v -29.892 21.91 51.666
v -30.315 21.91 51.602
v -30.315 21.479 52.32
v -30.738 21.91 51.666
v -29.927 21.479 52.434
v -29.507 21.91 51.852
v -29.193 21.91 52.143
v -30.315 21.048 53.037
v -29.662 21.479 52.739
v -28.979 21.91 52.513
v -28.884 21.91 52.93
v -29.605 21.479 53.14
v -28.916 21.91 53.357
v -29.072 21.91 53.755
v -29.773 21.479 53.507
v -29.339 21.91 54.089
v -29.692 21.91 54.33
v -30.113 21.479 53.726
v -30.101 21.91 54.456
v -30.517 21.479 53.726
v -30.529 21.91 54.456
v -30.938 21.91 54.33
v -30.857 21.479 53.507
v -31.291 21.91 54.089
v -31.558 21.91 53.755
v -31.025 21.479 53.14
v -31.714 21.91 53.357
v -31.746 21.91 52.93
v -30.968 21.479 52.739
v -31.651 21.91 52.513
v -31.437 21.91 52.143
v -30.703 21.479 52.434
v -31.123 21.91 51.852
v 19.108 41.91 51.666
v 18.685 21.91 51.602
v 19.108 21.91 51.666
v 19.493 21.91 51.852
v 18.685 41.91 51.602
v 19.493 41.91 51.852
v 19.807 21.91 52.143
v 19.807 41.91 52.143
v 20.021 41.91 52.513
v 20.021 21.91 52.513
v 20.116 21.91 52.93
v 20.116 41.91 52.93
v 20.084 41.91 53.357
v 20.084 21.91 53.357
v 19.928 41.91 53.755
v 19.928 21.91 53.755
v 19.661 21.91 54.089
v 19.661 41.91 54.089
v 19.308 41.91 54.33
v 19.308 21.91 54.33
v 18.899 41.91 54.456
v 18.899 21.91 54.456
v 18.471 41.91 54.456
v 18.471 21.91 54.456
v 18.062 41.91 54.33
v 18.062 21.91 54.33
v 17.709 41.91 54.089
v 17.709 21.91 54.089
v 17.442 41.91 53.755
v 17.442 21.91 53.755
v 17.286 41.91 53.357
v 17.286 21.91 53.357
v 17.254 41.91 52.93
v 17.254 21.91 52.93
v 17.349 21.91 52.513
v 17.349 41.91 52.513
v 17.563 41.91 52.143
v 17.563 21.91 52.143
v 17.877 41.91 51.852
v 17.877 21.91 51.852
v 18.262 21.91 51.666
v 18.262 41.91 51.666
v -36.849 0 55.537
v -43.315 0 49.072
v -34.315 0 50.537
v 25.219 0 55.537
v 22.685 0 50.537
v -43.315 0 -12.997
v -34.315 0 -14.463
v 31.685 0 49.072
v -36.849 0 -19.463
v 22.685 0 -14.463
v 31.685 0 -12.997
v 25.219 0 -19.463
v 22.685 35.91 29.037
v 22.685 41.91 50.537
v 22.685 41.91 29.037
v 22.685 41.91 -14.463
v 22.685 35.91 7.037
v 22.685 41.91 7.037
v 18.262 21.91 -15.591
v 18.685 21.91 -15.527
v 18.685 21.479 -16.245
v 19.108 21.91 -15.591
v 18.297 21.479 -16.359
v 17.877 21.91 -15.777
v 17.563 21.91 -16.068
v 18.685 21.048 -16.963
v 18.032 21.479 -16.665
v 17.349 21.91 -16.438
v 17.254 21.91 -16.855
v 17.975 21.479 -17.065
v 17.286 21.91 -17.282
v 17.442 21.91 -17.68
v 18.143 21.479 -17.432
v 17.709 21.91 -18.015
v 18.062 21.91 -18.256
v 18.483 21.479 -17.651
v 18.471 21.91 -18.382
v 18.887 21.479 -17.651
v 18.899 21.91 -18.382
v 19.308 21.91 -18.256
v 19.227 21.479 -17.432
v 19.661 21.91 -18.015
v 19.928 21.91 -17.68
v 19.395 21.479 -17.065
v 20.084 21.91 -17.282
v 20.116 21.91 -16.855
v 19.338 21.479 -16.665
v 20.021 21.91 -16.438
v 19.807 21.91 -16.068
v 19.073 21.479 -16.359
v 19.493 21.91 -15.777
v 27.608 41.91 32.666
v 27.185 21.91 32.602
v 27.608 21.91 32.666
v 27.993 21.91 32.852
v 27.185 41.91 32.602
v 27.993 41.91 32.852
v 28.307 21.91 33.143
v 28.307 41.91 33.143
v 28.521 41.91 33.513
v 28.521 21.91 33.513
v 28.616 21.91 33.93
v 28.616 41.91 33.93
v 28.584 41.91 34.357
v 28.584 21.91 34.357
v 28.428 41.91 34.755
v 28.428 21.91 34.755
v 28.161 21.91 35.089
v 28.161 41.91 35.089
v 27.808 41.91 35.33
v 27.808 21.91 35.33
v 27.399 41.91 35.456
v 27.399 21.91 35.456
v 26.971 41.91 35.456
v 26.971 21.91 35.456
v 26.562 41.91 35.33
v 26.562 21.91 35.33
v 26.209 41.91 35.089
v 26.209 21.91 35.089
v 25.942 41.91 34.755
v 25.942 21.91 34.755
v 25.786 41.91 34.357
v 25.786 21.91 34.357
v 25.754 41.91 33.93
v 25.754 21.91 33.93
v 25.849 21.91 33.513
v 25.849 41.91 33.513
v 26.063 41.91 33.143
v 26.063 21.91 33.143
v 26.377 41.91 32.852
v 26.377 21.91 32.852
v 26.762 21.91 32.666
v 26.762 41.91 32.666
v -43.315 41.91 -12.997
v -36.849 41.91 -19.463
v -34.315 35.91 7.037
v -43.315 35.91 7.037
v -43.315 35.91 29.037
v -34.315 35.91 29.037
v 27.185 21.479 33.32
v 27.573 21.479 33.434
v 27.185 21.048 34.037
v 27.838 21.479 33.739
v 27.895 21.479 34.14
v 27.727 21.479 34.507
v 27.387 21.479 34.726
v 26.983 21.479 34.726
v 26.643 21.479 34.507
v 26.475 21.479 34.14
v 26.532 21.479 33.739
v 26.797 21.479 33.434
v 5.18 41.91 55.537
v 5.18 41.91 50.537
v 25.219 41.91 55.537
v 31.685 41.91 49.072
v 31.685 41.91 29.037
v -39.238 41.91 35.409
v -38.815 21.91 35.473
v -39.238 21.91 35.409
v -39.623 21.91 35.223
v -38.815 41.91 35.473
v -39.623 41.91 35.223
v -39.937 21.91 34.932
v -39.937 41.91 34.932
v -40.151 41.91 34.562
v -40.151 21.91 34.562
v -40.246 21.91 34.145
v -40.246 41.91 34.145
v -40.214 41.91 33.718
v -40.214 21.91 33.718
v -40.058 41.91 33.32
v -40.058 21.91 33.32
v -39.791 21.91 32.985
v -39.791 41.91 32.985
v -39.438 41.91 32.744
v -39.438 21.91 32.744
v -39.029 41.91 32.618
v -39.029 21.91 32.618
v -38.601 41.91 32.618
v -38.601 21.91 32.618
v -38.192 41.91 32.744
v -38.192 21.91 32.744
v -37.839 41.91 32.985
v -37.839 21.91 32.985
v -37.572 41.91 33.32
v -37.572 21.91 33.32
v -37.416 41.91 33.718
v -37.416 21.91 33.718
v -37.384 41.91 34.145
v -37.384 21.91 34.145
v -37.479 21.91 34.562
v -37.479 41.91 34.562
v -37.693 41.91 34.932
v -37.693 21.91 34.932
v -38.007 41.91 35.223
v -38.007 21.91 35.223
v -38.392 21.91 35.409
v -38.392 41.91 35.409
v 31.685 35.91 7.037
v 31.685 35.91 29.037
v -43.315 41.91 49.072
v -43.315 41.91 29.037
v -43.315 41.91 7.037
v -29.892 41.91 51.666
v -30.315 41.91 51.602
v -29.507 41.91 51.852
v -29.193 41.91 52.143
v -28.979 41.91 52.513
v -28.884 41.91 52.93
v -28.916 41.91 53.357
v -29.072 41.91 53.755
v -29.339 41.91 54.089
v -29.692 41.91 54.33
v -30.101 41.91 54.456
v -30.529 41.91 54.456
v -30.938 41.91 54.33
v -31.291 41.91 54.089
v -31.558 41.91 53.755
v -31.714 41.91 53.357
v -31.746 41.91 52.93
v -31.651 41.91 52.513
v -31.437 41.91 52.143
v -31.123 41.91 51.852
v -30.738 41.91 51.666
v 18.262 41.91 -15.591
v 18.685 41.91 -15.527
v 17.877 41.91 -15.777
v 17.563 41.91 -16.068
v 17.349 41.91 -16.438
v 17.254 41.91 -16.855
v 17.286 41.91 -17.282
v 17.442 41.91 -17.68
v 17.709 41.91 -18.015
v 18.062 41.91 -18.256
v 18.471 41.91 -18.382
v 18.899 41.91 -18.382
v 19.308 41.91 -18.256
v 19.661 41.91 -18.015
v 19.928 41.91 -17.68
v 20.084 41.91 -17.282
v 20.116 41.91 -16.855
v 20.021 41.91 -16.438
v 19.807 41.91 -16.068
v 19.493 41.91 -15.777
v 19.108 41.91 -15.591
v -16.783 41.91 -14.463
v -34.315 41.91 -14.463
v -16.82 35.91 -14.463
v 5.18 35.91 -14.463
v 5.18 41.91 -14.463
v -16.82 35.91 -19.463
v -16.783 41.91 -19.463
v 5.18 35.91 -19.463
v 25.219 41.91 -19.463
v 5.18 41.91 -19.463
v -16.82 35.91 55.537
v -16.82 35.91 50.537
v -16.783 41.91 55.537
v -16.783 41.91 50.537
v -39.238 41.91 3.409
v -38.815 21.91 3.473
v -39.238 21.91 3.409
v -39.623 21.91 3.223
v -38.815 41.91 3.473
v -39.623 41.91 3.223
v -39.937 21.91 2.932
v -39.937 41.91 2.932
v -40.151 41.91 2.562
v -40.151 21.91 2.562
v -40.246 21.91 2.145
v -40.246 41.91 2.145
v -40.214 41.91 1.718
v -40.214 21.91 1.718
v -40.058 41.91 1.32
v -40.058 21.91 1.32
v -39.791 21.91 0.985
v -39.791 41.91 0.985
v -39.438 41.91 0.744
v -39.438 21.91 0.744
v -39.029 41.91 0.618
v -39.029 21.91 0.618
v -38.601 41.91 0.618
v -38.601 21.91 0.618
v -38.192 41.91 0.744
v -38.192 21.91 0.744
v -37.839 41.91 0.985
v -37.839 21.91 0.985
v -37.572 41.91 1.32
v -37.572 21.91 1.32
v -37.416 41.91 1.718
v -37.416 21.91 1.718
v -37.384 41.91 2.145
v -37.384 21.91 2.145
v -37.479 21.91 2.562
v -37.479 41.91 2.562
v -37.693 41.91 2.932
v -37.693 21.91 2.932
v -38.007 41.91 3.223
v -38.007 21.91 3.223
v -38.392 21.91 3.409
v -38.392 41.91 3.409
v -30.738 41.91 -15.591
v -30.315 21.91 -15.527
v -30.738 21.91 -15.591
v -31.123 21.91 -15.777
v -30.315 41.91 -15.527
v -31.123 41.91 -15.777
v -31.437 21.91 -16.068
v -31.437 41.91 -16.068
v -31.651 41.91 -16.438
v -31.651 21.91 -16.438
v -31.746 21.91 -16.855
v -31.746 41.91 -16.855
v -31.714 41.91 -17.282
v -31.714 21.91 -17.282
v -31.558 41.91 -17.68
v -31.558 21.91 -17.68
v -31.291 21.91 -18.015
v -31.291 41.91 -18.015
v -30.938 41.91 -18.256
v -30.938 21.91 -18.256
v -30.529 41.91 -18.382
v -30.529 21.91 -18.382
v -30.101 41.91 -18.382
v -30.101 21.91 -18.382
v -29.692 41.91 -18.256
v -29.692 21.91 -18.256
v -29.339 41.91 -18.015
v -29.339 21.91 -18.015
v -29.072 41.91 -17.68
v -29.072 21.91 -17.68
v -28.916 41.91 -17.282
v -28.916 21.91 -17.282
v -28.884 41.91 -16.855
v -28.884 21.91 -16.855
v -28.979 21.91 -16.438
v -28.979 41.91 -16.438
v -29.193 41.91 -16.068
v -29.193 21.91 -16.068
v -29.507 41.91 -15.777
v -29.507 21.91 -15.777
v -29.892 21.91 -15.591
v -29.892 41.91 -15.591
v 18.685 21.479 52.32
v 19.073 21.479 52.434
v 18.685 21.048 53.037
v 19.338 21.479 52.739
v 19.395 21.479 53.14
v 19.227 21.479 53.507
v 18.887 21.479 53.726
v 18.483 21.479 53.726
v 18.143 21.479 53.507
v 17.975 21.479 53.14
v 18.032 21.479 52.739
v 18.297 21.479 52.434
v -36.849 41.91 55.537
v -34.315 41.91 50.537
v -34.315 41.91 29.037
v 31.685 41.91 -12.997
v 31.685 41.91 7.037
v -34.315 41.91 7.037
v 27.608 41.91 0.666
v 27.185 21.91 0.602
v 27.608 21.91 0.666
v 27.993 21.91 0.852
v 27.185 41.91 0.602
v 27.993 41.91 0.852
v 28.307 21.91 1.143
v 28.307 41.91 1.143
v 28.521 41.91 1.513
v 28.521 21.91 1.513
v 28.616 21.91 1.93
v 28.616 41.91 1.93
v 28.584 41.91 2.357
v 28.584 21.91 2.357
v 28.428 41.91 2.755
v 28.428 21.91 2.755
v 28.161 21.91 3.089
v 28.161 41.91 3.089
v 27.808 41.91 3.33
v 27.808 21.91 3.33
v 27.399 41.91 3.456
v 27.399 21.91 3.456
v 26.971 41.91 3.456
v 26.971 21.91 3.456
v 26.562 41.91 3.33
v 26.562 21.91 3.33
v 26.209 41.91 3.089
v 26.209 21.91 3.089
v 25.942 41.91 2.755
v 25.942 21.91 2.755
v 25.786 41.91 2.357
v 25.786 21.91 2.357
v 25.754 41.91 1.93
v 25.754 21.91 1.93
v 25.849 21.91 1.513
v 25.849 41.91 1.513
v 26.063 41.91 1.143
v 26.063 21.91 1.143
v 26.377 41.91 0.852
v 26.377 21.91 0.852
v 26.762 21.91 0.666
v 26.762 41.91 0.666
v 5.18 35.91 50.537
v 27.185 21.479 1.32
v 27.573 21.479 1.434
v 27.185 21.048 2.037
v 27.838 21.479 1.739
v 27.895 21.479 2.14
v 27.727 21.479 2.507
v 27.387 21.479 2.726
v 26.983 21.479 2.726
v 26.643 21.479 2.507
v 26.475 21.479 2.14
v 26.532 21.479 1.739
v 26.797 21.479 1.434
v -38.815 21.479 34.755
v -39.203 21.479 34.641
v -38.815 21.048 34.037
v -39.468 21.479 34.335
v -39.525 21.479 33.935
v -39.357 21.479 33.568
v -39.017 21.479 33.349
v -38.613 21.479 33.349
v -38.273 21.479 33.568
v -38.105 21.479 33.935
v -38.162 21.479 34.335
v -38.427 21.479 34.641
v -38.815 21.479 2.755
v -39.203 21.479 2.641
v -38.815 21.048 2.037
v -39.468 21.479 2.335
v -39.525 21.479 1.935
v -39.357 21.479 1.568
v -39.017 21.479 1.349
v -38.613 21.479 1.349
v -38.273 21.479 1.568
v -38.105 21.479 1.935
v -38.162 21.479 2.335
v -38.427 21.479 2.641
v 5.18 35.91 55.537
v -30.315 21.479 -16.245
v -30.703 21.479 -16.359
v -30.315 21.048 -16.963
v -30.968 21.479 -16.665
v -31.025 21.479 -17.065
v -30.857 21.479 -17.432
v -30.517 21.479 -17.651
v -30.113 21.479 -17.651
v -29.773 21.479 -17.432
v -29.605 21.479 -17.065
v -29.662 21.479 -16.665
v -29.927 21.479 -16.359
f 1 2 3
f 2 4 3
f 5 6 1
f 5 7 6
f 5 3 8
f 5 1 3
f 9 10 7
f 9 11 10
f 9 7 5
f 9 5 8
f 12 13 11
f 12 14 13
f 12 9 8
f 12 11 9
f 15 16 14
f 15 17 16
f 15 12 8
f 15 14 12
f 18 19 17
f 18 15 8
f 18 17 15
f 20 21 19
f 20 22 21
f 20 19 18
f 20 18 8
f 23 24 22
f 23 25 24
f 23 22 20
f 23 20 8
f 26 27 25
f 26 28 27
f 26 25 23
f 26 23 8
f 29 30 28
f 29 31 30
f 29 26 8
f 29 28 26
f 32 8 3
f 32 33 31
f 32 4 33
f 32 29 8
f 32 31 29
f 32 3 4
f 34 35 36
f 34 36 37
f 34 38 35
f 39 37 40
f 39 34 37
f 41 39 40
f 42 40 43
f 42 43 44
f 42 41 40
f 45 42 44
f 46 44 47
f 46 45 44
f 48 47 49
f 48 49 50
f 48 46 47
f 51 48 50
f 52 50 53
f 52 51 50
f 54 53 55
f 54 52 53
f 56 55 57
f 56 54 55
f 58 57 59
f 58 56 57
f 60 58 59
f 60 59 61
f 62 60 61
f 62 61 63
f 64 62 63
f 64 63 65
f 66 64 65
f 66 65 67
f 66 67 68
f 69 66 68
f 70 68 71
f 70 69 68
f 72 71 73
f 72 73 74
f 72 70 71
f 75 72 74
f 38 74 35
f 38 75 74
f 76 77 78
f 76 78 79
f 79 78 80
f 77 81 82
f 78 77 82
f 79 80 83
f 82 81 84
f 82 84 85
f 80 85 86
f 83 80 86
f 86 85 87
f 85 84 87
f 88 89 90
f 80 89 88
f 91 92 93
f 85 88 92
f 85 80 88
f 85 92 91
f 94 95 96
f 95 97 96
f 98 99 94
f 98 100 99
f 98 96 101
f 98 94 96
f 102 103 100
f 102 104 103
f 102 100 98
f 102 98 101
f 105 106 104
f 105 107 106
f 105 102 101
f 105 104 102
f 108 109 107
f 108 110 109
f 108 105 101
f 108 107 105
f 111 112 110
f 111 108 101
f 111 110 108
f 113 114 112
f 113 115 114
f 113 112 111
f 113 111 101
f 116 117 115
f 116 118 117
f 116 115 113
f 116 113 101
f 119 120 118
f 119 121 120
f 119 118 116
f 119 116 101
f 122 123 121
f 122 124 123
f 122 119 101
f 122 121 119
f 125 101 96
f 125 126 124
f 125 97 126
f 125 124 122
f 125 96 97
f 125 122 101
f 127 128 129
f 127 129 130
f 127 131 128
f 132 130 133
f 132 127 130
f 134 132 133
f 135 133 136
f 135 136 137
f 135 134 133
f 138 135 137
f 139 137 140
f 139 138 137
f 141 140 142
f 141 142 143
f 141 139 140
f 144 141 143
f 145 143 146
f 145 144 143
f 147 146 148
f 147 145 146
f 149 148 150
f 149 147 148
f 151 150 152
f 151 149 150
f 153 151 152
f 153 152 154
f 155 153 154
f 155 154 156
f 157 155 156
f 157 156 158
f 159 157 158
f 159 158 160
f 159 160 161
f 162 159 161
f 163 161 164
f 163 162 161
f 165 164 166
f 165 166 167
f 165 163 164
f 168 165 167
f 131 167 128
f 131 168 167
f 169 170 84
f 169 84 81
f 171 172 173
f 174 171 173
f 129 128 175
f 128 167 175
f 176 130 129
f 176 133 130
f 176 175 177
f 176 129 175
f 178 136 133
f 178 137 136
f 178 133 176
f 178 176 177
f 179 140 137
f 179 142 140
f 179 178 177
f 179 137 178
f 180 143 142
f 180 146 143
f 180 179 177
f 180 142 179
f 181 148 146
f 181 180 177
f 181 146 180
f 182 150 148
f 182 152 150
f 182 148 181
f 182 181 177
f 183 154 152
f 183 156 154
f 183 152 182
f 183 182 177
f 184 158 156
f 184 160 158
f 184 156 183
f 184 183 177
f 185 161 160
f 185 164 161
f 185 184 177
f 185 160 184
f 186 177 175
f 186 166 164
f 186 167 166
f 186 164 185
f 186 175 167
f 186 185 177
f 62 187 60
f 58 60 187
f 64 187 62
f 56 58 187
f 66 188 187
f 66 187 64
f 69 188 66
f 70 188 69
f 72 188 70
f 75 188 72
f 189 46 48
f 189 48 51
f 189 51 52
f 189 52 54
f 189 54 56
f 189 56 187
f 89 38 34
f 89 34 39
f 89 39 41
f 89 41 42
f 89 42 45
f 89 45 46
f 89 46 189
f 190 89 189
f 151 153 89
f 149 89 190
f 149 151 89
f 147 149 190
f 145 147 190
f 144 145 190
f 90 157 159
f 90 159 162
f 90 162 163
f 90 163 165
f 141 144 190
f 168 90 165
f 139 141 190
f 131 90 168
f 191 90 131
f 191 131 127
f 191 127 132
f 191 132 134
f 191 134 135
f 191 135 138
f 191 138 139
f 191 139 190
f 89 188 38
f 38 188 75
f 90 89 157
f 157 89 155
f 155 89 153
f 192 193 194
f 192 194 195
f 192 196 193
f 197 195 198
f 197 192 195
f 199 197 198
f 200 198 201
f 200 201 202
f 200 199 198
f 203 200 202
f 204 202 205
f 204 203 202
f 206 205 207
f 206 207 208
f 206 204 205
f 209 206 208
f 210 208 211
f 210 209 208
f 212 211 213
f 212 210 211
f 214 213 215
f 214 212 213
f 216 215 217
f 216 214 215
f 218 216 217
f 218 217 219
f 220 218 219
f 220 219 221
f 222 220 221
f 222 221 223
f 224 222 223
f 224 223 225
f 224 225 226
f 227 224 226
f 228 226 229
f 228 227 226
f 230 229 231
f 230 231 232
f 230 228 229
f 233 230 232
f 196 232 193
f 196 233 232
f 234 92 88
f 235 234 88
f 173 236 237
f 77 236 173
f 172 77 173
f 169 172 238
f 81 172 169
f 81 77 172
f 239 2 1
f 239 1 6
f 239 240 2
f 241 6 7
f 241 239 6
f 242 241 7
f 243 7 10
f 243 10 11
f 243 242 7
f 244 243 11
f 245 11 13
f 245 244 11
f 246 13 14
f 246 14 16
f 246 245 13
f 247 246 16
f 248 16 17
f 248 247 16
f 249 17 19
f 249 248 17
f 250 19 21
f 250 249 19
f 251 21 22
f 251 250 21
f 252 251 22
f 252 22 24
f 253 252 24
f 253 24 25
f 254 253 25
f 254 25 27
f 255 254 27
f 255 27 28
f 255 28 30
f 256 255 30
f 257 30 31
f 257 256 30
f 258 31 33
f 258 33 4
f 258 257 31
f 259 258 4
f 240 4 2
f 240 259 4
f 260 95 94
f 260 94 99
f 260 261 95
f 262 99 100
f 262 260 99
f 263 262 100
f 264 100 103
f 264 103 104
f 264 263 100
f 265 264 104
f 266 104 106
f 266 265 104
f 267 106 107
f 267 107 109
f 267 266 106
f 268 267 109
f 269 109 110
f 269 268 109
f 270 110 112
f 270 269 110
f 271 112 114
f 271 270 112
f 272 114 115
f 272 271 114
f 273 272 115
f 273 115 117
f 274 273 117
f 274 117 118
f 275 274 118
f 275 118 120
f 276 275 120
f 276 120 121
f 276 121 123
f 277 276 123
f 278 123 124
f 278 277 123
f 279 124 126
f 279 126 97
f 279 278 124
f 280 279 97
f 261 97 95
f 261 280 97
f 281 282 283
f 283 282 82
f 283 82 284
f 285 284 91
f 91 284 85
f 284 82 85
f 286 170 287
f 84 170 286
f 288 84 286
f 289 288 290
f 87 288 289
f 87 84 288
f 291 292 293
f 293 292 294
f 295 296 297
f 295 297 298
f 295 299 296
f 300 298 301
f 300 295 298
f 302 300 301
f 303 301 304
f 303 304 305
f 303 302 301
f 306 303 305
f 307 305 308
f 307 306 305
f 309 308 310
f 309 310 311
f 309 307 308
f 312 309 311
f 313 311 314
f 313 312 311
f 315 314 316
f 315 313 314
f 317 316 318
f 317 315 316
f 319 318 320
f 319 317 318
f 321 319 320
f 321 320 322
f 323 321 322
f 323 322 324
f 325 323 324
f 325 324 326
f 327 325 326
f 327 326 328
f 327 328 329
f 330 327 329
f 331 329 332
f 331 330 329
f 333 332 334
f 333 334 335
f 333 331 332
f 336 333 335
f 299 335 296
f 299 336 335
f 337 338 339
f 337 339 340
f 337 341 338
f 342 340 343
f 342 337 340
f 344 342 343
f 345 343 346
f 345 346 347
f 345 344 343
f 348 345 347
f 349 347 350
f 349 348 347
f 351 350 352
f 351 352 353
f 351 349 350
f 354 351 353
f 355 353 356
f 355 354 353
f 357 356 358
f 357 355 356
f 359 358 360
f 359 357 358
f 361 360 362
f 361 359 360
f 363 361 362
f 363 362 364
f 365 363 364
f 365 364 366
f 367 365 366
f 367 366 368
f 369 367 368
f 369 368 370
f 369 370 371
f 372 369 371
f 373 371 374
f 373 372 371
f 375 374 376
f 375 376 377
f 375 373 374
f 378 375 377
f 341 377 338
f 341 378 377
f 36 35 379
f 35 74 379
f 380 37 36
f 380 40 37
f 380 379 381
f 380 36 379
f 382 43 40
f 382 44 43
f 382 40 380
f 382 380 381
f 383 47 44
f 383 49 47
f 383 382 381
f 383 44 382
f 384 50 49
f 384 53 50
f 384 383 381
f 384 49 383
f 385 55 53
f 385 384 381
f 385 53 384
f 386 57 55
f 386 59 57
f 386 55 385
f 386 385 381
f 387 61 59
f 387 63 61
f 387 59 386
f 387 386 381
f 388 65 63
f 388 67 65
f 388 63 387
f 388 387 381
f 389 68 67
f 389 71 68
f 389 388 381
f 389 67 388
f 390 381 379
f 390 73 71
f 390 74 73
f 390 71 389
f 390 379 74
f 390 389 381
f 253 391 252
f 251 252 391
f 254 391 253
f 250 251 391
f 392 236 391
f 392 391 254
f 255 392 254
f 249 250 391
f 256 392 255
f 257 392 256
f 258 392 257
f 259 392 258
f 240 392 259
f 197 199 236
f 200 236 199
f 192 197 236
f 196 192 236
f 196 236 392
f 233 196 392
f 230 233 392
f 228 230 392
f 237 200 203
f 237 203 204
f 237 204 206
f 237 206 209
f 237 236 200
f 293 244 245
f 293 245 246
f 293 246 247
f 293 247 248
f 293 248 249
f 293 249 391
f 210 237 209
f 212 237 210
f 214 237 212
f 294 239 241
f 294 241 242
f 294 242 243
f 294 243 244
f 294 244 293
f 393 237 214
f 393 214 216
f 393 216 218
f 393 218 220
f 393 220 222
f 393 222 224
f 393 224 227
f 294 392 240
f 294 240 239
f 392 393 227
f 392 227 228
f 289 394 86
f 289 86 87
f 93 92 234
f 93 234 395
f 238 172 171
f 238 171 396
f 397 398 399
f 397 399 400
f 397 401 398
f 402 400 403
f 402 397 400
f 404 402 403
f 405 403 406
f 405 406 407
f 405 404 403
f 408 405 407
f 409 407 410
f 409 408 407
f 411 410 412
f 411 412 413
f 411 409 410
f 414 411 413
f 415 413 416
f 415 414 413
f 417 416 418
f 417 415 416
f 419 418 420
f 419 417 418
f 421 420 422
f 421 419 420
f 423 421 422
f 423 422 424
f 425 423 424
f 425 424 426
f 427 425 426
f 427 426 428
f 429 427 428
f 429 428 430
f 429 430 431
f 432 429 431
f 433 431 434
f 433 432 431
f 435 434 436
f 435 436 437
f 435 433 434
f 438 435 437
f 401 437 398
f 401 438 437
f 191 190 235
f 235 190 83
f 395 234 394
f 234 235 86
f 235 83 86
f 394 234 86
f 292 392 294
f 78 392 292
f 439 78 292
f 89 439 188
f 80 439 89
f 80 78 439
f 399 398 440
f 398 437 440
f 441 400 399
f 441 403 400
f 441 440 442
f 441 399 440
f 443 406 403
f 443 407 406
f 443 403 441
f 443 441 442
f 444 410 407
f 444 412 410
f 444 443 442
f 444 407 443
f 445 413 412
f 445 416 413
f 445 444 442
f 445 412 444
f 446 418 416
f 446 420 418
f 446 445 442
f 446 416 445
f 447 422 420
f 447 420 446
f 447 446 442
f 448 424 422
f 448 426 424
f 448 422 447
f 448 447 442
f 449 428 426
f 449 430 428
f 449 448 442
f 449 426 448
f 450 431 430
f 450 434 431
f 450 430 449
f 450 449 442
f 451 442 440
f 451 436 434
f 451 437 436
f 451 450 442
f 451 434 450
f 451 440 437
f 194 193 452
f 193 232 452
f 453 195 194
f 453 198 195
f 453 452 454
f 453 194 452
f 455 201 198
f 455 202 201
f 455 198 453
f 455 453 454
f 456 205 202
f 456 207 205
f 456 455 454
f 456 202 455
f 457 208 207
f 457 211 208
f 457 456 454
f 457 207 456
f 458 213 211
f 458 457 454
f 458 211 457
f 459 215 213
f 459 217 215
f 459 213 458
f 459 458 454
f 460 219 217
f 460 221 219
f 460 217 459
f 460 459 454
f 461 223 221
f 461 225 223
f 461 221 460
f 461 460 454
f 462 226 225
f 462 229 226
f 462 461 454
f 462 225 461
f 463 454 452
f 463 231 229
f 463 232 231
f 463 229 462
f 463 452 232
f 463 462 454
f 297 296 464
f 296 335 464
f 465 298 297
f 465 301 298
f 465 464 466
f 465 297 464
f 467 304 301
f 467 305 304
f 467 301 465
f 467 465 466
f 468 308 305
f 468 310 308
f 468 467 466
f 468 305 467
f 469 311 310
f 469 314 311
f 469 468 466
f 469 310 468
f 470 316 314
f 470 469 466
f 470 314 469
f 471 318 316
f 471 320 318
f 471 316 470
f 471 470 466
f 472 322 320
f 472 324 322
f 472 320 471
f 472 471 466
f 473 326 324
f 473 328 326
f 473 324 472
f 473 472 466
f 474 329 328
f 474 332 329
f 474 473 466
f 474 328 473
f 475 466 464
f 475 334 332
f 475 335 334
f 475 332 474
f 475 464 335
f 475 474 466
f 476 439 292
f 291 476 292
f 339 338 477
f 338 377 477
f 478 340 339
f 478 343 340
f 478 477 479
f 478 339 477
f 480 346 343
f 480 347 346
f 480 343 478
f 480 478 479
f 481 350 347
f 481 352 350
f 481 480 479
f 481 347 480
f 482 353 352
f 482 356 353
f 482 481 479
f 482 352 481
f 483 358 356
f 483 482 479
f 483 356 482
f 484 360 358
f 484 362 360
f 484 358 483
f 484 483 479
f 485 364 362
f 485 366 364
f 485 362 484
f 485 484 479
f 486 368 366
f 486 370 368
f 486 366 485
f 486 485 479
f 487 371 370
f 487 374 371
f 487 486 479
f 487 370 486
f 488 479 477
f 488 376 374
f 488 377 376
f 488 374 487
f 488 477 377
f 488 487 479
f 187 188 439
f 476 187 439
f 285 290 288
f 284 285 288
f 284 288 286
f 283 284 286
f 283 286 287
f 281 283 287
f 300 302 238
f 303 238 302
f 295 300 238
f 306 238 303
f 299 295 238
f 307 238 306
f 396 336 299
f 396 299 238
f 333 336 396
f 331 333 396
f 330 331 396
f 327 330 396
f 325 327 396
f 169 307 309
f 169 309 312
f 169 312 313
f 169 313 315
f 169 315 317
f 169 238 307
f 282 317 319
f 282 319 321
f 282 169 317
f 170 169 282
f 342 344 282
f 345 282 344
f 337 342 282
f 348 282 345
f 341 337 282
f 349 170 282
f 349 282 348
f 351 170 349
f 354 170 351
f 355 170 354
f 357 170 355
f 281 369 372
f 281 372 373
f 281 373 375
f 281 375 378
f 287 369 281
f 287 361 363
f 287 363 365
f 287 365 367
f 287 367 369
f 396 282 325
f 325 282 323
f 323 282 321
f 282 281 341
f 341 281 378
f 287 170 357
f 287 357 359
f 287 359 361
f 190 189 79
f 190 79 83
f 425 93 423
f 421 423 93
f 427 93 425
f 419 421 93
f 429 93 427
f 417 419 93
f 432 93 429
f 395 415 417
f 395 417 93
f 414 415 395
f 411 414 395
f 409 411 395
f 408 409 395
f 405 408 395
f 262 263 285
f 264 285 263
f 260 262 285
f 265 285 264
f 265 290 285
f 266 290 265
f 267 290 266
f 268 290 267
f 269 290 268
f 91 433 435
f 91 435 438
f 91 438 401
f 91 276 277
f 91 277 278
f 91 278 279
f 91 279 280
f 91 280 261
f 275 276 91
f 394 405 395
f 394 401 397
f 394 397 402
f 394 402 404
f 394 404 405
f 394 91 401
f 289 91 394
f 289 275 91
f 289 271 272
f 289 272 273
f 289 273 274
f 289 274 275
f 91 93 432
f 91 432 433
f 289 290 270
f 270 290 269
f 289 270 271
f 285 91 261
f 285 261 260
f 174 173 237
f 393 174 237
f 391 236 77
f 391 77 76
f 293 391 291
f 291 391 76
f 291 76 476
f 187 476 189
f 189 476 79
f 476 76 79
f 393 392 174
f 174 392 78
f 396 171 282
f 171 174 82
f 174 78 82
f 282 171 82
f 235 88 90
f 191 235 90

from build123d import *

# Parameters (mm, degrees)
SKETCH2_W                          = 75
SKETCH2_H                          = 75
SKETCH2_W_2                        = 57
SKETCH2_H_2                        = 65
BOSS_EXTRUDE1_DEPTH                = 41.91
CUT_EXTRUDE1_DEPTH                 = 92.91
SKETCH6_W                          = 22
SKETCH6_H                          = 6
CUT_EXTRUDE2_DEPTH                 = 92.91
CUT_EXTRUDE3_DEPTH                 = 92.91
CIRPATTERN1_COUNT                  = 4
TAP_DRILL_FOR_6_40_TAP1_AT_2_COUNT = 2
TAP_DRILL_FOR_6_40_TAP1_AT_2_PITCH = 32
CIRPATTERN2_COUNT                  = 2
TAP_DRILL_FOR_6_40_TAP2_AT_2_COUNT = 2
TAP_DRILL_FOR_6_40_TAP2_AT_2_PITCH = 49
CIRPATTERN4_COUNT                  = 2


with BuildPart() as part:
    # Sketch2 → Boss-Extrude1 (new body)
    with BuildSketch(Plane(origin=(0, 0, 0), x_dir=(1, 0, 0), z_dir=(0, 1, 0))):
        with Locations((-5.814990765, -18.037415397)):
            Rectangle(SKETCH2_W, SKETCH2_H)
        with Locations((-5.814990765, -18.037415397)):
            Rectangle(SKETCH2_W_2, SKETCH2_H_2, mode=Mode.SUBTRACT)
    extrude(amount=BOSS_EXTRUDE1_DEPTH)

    # Sketch4 → Cut-Extrude1 (cut)
    with BuildSketch(Plane(origin=(0, 0, -19.462584603), x_dir=(-1, 0, 0), z_dir=(0, 0, -1))):
        Polygon((16.782729205, 41.915021022), (-5.180449965, 41.91), (-5.180449965, 35.91), (16.819550035, 35.91), align=None)
    extrude(amount=-CUT_EXTRUDE1_DEPTH, mode=Mode.SUBTRACT)

    # Sketch6 → Cut-Extrude2 (cut)
    with BuildSketch(Plane.ZY.offset(43.314990765)):
        with Locations((18.037415397, 38.91)):
            Rectangle(SKETCH6_W, SKETCH6_H)
    extrude(amount=-CUT_EXTRUDE2_DEPTH, mode=Mode.SUBTRACT)

    # Sketch7 → Cut-Extrude3 (cut)
    with BuildSketch(Plane(origin=(0, 41.91, 0), x_dir=(1, 0, 0), z_dir=(0, 1, 0))):
        Polygon((31.685009235, 12.996800195), (25.219224828, 19.462584603), (31.685009235, 19.462584603), align=None)
    cut_extrude3 = extrude(amount=-CUT_EXTRUDE3_DEPTH, mode=Mode.SUBTRACT)

    # CirPattern1: Cut-Extrude3 ×4 about axis
    cirpattern1_axis = Axis((-5.814990765, 41.91, 18.037415397), (0, 1, 0))
    for i in range(1, CIRPATTERN1_COUNT):
        add(cut_extrude3.rotate(cirpattern1_axis, i * 360 / CIRPATTERN1_COUNT), mode=Mode.SUBTRACT)

    # Sketch18 → Tap Drill for #6-40 Tap1 (revolve, cut)
    with BuildSketch(Plane(origin=(-38.814990765, 41.91, 2.037415397), x_dir=(0, 0, 1), z_dir=(1, 0, 0))):
        Polygon((0, 0), (0, 20.862295074), (1.4351, 20), (1.4351, 0), align=None)
    tap_drill_for_6_40_tap1 = revolve(axis=Axis((-38.814990765, 48.26, 2.037415397), (0, -1, 0)), mode=Mode.SUBTRACT)

    # Tap Drill for #6-40 Tap1 at 2: Tap Drill for #6-40 Tap1 ×2
    with Locations(*[(0, 0, i * TAP_DRILL_FOR_6_40_TAP1_AT_2_PITCH) for i in range(1, TAP_DRILL_FOR_6_40_TAP1_AT_2_COUNT)]):
        add(tap_drill_for_6_40_tap1, mode=Mode.SUBTRACT)

    # CirPattern2: Tap Drill for #6-40 Tap1 ×2 about axis
    cirpattern2_axis = Axis((-5.814990765, 41.91, 18.037415397), (0, 1, 0))
    for i in range(1, CIRPATTERN2_COUNT):
        add(tap_drill_for_6_40_tap1.rotate(cirpattern2_axis, i * 360 / CIRPATTERN2_COUNT), mode=Mode.SUBTRACT)

    # CirPattern2 copy 1 sketch → CirPattern2 copy 1 (revolve, cut)
    with BuildSketch(Plane(origin=(27.185009235, 41.91, 2.037415397), x_dir=(0, 0, -1), z_dir=(-1, 0, 0))):
        Polygon((0, 0), (0, 20.862295074), (1.4351, 20), (1.4351, 0), align=None)
    revolve(axis=Axis((27.185009235, 48.26, 2.037415397), (0, -1, 0)), mode=Mode.SUBTRACT)

    # Sketch23 → Tap Drill for #6-40 Tap2 (revolve, cut)
    with BuildSketch(Plane(origin=(-30.314990765, 41.91, -16.962584603), x_dir=(0, 0, 1), z_dir=(1, 0, 0))):
        Polygon((0, 0), (0, 20.862295074), (1.4351, 20), (1.4351, 0), align=None)
    tap_drill_for_6_40_tap2 = revolve(axis=Axis((-30.314990765, 48.26, -16.962584603), (0, -1, 0)), mode=Mode.SUBTRACT)

    # Tap Drill for #6-40 Tap2 at 2: Tap Drill for #6-40 Tap2 ×2
    with Locations(*[(i * TAP_DRILL_FOR_6_40_TAP2_AT_2_PITCH, 0, 0) for i in range(1, TAP_DRILL_FOR_6_40_TAP2_AT_2_COUNT)]):
        add(tap_drill_for_6_40_tap2, mode=Mode.SUBTRACT)

    # CirPattern4: Tap Drill for #6-40 Tap2 ×2 about axis
    cirpattern4_axis = Axis((-5.814990765, 41.91, 18.037415397), (0, 1, 0))
    for i in range(1, CIRPATTERN4_COUNT):
        add(tap_drill_for_6_40_tap2.rotate(cirpattern4_axis, i * 360 / CIRPATTERN4_COUNT), mode=Mode.SUBTRACT)

    # CirPattern4 copy 1 sketch → CirPattern4 copy 1 (revolve, cut)
    with BuildSketch(Plane(origin=(-30.314990765, 41.91, 53.037415397), x_dir=(0, 0, -1), z_dir=(-1, 0, 0))):
        Polygon((0, 0), (0, 20.862295074), (1.4351, 20), (1.4351, 0), align=None)
    revolve(axis=Axis((-30.314990765, 48.26, 53.037415397), (0, -1, 0)), mode=Mode.SUBTRACT)


solid = part.part
